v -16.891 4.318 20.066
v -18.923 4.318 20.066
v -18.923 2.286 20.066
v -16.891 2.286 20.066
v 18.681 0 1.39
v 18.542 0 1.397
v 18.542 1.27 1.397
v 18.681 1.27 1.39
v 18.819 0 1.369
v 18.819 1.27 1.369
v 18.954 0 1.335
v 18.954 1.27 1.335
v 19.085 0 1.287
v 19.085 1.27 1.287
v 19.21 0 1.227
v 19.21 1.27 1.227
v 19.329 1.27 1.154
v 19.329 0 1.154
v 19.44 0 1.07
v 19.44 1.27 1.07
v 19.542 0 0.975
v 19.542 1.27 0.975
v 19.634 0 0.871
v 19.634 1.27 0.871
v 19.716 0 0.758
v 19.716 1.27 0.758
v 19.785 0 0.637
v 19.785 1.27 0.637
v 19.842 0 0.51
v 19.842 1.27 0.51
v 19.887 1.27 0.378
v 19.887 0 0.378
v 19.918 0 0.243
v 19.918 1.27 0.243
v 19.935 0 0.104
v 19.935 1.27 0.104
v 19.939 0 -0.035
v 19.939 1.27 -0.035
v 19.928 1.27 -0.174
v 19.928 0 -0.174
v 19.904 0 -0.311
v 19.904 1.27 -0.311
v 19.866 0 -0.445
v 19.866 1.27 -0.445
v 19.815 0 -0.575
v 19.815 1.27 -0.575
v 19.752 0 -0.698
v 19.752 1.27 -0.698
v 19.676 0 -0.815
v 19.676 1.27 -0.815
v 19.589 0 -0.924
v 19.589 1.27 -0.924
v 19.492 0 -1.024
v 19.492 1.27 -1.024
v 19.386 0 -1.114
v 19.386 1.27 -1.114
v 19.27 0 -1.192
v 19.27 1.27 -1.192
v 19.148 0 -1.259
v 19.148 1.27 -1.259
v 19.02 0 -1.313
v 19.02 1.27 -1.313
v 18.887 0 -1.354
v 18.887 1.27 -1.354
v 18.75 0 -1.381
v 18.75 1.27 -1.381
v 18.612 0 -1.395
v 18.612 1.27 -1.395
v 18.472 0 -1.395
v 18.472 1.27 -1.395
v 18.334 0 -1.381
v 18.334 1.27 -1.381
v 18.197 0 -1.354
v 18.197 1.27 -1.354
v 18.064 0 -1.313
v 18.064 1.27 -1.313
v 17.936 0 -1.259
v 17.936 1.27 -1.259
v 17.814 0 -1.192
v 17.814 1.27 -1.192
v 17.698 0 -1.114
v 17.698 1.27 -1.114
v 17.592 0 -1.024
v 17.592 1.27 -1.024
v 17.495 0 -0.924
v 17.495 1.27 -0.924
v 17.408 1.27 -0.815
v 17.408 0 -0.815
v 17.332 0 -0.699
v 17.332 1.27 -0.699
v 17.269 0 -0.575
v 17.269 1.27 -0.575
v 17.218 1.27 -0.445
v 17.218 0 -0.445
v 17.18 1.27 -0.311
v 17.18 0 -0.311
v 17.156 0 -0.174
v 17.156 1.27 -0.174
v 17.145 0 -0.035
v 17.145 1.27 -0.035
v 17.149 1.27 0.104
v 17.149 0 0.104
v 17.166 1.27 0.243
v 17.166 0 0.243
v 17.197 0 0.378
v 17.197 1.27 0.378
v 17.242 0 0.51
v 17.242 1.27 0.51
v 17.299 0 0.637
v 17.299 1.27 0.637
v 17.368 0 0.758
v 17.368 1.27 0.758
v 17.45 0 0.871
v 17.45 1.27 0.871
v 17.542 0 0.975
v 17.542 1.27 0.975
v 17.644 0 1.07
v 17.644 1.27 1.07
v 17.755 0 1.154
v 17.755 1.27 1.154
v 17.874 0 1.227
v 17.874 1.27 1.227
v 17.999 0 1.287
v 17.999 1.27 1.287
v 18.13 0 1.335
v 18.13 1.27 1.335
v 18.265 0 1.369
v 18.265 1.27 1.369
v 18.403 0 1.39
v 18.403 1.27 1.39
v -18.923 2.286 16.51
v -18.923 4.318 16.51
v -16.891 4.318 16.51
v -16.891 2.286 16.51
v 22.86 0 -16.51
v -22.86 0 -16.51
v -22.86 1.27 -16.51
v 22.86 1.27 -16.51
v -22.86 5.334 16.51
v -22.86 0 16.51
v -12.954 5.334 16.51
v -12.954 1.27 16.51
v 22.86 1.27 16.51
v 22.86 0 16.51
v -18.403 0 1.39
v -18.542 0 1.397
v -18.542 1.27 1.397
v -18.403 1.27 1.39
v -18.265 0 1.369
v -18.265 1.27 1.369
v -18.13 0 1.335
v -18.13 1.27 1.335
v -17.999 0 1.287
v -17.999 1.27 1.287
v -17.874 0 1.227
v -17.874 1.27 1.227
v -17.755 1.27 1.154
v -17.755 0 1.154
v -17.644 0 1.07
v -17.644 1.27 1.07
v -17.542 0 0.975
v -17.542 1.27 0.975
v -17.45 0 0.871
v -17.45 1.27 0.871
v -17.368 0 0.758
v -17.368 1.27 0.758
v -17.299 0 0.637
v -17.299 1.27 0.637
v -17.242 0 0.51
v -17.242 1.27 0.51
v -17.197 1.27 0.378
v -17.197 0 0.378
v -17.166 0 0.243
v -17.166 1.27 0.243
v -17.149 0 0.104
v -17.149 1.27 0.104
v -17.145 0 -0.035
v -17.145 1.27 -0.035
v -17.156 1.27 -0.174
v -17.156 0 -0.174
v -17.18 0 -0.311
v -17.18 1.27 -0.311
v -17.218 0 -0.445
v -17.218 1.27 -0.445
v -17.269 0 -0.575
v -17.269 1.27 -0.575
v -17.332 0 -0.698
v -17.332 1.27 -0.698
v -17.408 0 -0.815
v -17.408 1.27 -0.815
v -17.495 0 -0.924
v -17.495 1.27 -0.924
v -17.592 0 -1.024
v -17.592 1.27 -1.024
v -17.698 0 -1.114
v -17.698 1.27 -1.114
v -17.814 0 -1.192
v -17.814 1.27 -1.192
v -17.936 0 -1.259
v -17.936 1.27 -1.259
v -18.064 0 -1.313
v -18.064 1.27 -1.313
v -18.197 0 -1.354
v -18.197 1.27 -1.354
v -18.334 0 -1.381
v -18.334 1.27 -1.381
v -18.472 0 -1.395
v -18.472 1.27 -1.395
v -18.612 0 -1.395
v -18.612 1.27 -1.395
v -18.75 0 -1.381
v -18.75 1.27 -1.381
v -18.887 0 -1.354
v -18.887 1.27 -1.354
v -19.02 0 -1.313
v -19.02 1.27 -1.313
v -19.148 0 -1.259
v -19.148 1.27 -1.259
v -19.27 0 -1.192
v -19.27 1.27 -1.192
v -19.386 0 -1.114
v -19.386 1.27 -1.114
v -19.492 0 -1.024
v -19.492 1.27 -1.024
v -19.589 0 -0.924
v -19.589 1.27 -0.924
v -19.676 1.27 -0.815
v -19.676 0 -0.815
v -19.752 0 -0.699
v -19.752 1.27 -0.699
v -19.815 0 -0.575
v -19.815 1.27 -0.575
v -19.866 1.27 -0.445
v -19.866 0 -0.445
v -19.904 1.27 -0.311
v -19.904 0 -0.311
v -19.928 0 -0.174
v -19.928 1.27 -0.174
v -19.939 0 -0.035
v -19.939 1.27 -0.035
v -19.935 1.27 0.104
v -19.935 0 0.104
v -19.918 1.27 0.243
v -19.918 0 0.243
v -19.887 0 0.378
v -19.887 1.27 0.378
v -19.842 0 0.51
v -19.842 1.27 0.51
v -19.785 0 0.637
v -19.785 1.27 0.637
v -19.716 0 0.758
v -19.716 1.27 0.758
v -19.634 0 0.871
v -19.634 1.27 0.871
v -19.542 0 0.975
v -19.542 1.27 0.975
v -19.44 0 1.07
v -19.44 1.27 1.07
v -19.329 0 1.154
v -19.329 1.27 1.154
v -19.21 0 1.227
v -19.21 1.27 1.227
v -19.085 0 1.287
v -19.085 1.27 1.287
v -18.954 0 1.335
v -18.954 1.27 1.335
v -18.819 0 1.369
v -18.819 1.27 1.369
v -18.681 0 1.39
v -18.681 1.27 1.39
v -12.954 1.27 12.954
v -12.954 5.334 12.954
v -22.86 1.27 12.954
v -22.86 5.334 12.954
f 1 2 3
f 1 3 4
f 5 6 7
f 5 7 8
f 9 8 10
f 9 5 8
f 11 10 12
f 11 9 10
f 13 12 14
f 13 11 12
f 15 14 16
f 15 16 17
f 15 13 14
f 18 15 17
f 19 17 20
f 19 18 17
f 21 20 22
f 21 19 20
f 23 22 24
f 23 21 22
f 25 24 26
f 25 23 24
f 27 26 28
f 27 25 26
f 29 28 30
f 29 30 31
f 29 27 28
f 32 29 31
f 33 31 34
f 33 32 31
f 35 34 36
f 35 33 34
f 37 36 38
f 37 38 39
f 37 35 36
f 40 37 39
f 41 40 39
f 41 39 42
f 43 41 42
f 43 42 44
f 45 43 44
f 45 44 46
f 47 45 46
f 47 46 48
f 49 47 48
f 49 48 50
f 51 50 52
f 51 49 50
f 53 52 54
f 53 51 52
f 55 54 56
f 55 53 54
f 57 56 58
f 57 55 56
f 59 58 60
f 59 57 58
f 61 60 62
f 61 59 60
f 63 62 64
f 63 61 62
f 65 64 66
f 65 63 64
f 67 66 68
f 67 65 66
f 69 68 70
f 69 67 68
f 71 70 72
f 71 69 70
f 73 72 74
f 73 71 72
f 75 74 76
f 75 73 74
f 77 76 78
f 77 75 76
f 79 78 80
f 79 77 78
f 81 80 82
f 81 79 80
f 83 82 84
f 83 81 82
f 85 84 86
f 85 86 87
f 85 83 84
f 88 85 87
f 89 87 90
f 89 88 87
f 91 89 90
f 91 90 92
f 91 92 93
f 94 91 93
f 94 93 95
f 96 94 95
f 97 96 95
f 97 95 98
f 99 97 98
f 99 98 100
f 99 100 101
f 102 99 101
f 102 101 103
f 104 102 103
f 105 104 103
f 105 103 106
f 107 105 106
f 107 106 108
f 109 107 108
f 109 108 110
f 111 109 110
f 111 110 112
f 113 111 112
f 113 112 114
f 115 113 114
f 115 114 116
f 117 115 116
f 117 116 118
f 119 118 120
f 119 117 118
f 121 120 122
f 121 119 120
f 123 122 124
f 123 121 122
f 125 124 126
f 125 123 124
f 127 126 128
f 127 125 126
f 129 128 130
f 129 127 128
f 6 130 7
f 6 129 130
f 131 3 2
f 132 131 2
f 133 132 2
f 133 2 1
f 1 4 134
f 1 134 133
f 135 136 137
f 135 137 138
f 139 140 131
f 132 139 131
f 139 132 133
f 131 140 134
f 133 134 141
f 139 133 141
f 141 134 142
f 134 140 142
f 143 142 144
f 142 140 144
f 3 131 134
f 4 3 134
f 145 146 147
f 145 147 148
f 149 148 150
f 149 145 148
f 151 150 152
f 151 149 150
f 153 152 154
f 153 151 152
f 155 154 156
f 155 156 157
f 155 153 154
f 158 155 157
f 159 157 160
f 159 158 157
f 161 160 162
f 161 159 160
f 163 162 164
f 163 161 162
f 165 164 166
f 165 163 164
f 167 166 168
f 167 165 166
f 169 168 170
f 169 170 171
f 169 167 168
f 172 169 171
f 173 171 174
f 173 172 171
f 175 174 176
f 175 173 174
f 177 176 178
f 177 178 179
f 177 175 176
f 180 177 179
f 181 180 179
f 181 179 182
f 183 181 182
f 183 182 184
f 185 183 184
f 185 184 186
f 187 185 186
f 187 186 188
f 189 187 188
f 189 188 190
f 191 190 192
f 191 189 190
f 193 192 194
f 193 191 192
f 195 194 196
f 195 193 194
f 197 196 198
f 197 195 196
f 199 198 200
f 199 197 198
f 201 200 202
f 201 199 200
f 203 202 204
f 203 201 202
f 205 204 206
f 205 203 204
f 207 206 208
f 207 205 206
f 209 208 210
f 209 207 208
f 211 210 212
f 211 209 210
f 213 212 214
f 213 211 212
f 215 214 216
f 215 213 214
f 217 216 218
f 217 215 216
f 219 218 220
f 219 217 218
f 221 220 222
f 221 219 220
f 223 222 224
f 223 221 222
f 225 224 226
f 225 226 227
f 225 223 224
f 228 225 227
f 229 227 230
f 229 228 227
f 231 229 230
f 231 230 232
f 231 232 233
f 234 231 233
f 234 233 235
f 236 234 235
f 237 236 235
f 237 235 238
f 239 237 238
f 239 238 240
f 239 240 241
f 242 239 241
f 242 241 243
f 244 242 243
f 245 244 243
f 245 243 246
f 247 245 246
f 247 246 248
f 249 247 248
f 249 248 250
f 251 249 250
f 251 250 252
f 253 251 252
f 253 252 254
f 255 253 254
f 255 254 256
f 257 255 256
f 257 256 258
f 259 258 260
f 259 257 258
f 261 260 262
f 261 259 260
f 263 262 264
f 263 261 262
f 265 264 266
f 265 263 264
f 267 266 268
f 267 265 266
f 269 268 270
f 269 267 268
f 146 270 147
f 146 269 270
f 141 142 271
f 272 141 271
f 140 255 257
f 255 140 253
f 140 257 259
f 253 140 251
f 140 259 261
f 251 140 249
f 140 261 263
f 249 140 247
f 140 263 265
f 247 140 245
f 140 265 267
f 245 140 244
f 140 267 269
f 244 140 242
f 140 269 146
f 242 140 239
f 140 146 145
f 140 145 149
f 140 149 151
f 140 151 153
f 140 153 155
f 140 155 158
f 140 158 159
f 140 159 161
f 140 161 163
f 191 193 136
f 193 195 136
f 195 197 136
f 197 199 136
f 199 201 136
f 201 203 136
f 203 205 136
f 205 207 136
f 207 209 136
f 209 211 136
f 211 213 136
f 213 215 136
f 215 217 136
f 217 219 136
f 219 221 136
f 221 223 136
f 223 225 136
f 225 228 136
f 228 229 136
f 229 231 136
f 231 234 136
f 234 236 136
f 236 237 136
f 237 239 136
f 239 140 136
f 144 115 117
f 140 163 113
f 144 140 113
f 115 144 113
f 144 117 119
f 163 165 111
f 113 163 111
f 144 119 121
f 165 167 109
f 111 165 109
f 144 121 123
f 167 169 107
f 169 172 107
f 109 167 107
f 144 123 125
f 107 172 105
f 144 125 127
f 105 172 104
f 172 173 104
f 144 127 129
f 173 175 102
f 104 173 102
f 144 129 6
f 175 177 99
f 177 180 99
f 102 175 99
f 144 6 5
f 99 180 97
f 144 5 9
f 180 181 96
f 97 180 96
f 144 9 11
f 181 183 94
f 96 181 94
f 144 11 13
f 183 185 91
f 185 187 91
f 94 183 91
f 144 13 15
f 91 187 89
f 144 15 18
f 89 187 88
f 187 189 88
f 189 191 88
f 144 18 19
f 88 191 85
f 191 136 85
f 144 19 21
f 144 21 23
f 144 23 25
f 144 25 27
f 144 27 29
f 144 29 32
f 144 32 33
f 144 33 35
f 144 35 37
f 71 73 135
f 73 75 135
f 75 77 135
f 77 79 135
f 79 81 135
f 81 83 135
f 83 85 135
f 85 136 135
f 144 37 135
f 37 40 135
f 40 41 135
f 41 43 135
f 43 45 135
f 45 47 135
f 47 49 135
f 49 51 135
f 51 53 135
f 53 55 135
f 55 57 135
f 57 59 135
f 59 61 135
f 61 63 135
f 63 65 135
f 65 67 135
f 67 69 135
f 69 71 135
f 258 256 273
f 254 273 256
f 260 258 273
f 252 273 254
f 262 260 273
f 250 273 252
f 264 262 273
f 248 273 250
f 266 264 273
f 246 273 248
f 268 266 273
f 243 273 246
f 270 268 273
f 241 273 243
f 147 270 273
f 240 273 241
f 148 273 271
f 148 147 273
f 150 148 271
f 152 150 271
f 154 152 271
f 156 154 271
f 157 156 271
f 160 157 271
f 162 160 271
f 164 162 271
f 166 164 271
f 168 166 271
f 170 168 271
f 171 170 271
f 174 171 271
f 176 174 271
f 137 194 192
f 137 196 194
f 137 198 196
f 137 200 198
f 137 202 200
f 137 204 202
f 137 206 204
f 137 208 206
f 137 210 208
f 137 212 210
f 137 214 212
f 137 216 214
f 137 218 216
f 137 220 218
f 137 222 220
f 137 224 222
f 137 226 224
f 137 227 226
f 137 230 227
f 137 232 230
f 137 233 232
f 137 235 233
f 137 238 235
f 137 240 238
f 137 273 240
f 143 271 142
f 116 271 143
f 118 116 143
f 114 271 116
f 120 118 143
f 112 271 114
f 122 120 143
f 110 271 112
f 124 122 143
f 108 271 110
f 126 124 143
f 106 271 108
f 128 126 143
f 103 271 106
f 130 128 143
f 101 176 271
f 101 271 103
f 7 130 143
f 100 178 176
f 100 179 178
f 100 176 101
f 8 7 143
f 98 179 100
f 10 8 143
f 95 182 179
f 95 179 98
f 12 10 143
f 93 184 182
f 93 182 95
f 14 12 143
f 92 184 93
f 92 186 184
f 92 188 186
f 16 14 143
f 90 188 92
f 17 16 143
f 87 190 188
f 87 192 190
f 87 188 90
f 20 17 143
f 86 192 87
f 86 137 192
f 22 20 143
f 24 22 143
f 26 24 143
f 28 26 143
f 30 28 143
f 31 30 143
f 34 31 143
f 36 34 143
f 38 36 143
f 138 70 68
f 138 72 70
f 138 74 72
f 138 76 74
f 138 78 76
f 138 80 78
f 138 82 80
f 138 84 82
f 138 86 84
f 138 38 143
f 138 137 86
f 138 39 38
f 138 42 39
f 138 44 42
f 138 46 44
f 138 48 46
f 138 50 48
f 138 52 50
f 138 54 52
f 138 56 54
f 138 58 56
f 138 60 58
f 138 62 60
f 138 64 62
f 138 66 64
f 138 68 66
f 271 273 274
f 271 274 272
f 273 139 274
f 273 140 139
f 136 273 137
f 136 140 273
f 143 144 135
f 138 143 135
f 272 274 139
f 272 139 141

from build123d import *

# Parameters (mm, degrees)
SKETCH1_W           = 45.72
SKETCH1_H           = 33.02
SKETCH1_R           = 1.397
BOSS_EXTRUDE1_DEPTH = 1.27
SKETCH3_W           = 9.906
SKETCH3_H           = 3.556
BOSS_EXTRUDE2_DEPTH = 4.064
SKETCH4_W           = 2.032
SKETCH4_H           = 2.032
BOSS_EXTRUDE3_DEPTH = 3.556


with BuildPart() as part:
    # Sketch1 → Boss-Extrude1 (new body)
    with BuildSketch(Plane(origin=(0, 0, 0), x_dir=(1, 0, 0), z_dir=(0, 1, 0))):
        Rectangle(SKETCH1_W, SKETCH1_H)
        with Locations(Location((-18.542, 0, 0), (0, 0, 270))):
            Circle(SKETCH1_R, mode=Mode.SUBTRACT)
        with Locations(Location((18.542, 0, 0), (0, 0, 270))):
            Circle(SKETCH1_R, mode=Mode.SUBTRACT)
    extrude(amount=BOSS_EXTRUDE1_DEPTH)

    # Sketch3 → Boss-Extrude2 (add)
    with BuildSketch(Plane(origin=(0, 1.27, 0), x_dir=(1, 0, 0), z_dir=(0, 1, 0))):
        with Locations((-17.907, -14.732)):
            Rectangle(SKETCH3_W, SKETCH3_H)
    extrude(amount=BOSS_EXTRUDE2_DEPTH)

    # Sketch4 → Boss-Extrude3 (add)
    with BuildSketch(Plane.XY.offset(16.51)):
        with Locations((-17.907, 3.302)):
            Rectangle(SKETCH4_W, SKETCH4_H)
    extrude(amount=BOSS_EXTRUDE3_DEPTH)


solid = part.part
